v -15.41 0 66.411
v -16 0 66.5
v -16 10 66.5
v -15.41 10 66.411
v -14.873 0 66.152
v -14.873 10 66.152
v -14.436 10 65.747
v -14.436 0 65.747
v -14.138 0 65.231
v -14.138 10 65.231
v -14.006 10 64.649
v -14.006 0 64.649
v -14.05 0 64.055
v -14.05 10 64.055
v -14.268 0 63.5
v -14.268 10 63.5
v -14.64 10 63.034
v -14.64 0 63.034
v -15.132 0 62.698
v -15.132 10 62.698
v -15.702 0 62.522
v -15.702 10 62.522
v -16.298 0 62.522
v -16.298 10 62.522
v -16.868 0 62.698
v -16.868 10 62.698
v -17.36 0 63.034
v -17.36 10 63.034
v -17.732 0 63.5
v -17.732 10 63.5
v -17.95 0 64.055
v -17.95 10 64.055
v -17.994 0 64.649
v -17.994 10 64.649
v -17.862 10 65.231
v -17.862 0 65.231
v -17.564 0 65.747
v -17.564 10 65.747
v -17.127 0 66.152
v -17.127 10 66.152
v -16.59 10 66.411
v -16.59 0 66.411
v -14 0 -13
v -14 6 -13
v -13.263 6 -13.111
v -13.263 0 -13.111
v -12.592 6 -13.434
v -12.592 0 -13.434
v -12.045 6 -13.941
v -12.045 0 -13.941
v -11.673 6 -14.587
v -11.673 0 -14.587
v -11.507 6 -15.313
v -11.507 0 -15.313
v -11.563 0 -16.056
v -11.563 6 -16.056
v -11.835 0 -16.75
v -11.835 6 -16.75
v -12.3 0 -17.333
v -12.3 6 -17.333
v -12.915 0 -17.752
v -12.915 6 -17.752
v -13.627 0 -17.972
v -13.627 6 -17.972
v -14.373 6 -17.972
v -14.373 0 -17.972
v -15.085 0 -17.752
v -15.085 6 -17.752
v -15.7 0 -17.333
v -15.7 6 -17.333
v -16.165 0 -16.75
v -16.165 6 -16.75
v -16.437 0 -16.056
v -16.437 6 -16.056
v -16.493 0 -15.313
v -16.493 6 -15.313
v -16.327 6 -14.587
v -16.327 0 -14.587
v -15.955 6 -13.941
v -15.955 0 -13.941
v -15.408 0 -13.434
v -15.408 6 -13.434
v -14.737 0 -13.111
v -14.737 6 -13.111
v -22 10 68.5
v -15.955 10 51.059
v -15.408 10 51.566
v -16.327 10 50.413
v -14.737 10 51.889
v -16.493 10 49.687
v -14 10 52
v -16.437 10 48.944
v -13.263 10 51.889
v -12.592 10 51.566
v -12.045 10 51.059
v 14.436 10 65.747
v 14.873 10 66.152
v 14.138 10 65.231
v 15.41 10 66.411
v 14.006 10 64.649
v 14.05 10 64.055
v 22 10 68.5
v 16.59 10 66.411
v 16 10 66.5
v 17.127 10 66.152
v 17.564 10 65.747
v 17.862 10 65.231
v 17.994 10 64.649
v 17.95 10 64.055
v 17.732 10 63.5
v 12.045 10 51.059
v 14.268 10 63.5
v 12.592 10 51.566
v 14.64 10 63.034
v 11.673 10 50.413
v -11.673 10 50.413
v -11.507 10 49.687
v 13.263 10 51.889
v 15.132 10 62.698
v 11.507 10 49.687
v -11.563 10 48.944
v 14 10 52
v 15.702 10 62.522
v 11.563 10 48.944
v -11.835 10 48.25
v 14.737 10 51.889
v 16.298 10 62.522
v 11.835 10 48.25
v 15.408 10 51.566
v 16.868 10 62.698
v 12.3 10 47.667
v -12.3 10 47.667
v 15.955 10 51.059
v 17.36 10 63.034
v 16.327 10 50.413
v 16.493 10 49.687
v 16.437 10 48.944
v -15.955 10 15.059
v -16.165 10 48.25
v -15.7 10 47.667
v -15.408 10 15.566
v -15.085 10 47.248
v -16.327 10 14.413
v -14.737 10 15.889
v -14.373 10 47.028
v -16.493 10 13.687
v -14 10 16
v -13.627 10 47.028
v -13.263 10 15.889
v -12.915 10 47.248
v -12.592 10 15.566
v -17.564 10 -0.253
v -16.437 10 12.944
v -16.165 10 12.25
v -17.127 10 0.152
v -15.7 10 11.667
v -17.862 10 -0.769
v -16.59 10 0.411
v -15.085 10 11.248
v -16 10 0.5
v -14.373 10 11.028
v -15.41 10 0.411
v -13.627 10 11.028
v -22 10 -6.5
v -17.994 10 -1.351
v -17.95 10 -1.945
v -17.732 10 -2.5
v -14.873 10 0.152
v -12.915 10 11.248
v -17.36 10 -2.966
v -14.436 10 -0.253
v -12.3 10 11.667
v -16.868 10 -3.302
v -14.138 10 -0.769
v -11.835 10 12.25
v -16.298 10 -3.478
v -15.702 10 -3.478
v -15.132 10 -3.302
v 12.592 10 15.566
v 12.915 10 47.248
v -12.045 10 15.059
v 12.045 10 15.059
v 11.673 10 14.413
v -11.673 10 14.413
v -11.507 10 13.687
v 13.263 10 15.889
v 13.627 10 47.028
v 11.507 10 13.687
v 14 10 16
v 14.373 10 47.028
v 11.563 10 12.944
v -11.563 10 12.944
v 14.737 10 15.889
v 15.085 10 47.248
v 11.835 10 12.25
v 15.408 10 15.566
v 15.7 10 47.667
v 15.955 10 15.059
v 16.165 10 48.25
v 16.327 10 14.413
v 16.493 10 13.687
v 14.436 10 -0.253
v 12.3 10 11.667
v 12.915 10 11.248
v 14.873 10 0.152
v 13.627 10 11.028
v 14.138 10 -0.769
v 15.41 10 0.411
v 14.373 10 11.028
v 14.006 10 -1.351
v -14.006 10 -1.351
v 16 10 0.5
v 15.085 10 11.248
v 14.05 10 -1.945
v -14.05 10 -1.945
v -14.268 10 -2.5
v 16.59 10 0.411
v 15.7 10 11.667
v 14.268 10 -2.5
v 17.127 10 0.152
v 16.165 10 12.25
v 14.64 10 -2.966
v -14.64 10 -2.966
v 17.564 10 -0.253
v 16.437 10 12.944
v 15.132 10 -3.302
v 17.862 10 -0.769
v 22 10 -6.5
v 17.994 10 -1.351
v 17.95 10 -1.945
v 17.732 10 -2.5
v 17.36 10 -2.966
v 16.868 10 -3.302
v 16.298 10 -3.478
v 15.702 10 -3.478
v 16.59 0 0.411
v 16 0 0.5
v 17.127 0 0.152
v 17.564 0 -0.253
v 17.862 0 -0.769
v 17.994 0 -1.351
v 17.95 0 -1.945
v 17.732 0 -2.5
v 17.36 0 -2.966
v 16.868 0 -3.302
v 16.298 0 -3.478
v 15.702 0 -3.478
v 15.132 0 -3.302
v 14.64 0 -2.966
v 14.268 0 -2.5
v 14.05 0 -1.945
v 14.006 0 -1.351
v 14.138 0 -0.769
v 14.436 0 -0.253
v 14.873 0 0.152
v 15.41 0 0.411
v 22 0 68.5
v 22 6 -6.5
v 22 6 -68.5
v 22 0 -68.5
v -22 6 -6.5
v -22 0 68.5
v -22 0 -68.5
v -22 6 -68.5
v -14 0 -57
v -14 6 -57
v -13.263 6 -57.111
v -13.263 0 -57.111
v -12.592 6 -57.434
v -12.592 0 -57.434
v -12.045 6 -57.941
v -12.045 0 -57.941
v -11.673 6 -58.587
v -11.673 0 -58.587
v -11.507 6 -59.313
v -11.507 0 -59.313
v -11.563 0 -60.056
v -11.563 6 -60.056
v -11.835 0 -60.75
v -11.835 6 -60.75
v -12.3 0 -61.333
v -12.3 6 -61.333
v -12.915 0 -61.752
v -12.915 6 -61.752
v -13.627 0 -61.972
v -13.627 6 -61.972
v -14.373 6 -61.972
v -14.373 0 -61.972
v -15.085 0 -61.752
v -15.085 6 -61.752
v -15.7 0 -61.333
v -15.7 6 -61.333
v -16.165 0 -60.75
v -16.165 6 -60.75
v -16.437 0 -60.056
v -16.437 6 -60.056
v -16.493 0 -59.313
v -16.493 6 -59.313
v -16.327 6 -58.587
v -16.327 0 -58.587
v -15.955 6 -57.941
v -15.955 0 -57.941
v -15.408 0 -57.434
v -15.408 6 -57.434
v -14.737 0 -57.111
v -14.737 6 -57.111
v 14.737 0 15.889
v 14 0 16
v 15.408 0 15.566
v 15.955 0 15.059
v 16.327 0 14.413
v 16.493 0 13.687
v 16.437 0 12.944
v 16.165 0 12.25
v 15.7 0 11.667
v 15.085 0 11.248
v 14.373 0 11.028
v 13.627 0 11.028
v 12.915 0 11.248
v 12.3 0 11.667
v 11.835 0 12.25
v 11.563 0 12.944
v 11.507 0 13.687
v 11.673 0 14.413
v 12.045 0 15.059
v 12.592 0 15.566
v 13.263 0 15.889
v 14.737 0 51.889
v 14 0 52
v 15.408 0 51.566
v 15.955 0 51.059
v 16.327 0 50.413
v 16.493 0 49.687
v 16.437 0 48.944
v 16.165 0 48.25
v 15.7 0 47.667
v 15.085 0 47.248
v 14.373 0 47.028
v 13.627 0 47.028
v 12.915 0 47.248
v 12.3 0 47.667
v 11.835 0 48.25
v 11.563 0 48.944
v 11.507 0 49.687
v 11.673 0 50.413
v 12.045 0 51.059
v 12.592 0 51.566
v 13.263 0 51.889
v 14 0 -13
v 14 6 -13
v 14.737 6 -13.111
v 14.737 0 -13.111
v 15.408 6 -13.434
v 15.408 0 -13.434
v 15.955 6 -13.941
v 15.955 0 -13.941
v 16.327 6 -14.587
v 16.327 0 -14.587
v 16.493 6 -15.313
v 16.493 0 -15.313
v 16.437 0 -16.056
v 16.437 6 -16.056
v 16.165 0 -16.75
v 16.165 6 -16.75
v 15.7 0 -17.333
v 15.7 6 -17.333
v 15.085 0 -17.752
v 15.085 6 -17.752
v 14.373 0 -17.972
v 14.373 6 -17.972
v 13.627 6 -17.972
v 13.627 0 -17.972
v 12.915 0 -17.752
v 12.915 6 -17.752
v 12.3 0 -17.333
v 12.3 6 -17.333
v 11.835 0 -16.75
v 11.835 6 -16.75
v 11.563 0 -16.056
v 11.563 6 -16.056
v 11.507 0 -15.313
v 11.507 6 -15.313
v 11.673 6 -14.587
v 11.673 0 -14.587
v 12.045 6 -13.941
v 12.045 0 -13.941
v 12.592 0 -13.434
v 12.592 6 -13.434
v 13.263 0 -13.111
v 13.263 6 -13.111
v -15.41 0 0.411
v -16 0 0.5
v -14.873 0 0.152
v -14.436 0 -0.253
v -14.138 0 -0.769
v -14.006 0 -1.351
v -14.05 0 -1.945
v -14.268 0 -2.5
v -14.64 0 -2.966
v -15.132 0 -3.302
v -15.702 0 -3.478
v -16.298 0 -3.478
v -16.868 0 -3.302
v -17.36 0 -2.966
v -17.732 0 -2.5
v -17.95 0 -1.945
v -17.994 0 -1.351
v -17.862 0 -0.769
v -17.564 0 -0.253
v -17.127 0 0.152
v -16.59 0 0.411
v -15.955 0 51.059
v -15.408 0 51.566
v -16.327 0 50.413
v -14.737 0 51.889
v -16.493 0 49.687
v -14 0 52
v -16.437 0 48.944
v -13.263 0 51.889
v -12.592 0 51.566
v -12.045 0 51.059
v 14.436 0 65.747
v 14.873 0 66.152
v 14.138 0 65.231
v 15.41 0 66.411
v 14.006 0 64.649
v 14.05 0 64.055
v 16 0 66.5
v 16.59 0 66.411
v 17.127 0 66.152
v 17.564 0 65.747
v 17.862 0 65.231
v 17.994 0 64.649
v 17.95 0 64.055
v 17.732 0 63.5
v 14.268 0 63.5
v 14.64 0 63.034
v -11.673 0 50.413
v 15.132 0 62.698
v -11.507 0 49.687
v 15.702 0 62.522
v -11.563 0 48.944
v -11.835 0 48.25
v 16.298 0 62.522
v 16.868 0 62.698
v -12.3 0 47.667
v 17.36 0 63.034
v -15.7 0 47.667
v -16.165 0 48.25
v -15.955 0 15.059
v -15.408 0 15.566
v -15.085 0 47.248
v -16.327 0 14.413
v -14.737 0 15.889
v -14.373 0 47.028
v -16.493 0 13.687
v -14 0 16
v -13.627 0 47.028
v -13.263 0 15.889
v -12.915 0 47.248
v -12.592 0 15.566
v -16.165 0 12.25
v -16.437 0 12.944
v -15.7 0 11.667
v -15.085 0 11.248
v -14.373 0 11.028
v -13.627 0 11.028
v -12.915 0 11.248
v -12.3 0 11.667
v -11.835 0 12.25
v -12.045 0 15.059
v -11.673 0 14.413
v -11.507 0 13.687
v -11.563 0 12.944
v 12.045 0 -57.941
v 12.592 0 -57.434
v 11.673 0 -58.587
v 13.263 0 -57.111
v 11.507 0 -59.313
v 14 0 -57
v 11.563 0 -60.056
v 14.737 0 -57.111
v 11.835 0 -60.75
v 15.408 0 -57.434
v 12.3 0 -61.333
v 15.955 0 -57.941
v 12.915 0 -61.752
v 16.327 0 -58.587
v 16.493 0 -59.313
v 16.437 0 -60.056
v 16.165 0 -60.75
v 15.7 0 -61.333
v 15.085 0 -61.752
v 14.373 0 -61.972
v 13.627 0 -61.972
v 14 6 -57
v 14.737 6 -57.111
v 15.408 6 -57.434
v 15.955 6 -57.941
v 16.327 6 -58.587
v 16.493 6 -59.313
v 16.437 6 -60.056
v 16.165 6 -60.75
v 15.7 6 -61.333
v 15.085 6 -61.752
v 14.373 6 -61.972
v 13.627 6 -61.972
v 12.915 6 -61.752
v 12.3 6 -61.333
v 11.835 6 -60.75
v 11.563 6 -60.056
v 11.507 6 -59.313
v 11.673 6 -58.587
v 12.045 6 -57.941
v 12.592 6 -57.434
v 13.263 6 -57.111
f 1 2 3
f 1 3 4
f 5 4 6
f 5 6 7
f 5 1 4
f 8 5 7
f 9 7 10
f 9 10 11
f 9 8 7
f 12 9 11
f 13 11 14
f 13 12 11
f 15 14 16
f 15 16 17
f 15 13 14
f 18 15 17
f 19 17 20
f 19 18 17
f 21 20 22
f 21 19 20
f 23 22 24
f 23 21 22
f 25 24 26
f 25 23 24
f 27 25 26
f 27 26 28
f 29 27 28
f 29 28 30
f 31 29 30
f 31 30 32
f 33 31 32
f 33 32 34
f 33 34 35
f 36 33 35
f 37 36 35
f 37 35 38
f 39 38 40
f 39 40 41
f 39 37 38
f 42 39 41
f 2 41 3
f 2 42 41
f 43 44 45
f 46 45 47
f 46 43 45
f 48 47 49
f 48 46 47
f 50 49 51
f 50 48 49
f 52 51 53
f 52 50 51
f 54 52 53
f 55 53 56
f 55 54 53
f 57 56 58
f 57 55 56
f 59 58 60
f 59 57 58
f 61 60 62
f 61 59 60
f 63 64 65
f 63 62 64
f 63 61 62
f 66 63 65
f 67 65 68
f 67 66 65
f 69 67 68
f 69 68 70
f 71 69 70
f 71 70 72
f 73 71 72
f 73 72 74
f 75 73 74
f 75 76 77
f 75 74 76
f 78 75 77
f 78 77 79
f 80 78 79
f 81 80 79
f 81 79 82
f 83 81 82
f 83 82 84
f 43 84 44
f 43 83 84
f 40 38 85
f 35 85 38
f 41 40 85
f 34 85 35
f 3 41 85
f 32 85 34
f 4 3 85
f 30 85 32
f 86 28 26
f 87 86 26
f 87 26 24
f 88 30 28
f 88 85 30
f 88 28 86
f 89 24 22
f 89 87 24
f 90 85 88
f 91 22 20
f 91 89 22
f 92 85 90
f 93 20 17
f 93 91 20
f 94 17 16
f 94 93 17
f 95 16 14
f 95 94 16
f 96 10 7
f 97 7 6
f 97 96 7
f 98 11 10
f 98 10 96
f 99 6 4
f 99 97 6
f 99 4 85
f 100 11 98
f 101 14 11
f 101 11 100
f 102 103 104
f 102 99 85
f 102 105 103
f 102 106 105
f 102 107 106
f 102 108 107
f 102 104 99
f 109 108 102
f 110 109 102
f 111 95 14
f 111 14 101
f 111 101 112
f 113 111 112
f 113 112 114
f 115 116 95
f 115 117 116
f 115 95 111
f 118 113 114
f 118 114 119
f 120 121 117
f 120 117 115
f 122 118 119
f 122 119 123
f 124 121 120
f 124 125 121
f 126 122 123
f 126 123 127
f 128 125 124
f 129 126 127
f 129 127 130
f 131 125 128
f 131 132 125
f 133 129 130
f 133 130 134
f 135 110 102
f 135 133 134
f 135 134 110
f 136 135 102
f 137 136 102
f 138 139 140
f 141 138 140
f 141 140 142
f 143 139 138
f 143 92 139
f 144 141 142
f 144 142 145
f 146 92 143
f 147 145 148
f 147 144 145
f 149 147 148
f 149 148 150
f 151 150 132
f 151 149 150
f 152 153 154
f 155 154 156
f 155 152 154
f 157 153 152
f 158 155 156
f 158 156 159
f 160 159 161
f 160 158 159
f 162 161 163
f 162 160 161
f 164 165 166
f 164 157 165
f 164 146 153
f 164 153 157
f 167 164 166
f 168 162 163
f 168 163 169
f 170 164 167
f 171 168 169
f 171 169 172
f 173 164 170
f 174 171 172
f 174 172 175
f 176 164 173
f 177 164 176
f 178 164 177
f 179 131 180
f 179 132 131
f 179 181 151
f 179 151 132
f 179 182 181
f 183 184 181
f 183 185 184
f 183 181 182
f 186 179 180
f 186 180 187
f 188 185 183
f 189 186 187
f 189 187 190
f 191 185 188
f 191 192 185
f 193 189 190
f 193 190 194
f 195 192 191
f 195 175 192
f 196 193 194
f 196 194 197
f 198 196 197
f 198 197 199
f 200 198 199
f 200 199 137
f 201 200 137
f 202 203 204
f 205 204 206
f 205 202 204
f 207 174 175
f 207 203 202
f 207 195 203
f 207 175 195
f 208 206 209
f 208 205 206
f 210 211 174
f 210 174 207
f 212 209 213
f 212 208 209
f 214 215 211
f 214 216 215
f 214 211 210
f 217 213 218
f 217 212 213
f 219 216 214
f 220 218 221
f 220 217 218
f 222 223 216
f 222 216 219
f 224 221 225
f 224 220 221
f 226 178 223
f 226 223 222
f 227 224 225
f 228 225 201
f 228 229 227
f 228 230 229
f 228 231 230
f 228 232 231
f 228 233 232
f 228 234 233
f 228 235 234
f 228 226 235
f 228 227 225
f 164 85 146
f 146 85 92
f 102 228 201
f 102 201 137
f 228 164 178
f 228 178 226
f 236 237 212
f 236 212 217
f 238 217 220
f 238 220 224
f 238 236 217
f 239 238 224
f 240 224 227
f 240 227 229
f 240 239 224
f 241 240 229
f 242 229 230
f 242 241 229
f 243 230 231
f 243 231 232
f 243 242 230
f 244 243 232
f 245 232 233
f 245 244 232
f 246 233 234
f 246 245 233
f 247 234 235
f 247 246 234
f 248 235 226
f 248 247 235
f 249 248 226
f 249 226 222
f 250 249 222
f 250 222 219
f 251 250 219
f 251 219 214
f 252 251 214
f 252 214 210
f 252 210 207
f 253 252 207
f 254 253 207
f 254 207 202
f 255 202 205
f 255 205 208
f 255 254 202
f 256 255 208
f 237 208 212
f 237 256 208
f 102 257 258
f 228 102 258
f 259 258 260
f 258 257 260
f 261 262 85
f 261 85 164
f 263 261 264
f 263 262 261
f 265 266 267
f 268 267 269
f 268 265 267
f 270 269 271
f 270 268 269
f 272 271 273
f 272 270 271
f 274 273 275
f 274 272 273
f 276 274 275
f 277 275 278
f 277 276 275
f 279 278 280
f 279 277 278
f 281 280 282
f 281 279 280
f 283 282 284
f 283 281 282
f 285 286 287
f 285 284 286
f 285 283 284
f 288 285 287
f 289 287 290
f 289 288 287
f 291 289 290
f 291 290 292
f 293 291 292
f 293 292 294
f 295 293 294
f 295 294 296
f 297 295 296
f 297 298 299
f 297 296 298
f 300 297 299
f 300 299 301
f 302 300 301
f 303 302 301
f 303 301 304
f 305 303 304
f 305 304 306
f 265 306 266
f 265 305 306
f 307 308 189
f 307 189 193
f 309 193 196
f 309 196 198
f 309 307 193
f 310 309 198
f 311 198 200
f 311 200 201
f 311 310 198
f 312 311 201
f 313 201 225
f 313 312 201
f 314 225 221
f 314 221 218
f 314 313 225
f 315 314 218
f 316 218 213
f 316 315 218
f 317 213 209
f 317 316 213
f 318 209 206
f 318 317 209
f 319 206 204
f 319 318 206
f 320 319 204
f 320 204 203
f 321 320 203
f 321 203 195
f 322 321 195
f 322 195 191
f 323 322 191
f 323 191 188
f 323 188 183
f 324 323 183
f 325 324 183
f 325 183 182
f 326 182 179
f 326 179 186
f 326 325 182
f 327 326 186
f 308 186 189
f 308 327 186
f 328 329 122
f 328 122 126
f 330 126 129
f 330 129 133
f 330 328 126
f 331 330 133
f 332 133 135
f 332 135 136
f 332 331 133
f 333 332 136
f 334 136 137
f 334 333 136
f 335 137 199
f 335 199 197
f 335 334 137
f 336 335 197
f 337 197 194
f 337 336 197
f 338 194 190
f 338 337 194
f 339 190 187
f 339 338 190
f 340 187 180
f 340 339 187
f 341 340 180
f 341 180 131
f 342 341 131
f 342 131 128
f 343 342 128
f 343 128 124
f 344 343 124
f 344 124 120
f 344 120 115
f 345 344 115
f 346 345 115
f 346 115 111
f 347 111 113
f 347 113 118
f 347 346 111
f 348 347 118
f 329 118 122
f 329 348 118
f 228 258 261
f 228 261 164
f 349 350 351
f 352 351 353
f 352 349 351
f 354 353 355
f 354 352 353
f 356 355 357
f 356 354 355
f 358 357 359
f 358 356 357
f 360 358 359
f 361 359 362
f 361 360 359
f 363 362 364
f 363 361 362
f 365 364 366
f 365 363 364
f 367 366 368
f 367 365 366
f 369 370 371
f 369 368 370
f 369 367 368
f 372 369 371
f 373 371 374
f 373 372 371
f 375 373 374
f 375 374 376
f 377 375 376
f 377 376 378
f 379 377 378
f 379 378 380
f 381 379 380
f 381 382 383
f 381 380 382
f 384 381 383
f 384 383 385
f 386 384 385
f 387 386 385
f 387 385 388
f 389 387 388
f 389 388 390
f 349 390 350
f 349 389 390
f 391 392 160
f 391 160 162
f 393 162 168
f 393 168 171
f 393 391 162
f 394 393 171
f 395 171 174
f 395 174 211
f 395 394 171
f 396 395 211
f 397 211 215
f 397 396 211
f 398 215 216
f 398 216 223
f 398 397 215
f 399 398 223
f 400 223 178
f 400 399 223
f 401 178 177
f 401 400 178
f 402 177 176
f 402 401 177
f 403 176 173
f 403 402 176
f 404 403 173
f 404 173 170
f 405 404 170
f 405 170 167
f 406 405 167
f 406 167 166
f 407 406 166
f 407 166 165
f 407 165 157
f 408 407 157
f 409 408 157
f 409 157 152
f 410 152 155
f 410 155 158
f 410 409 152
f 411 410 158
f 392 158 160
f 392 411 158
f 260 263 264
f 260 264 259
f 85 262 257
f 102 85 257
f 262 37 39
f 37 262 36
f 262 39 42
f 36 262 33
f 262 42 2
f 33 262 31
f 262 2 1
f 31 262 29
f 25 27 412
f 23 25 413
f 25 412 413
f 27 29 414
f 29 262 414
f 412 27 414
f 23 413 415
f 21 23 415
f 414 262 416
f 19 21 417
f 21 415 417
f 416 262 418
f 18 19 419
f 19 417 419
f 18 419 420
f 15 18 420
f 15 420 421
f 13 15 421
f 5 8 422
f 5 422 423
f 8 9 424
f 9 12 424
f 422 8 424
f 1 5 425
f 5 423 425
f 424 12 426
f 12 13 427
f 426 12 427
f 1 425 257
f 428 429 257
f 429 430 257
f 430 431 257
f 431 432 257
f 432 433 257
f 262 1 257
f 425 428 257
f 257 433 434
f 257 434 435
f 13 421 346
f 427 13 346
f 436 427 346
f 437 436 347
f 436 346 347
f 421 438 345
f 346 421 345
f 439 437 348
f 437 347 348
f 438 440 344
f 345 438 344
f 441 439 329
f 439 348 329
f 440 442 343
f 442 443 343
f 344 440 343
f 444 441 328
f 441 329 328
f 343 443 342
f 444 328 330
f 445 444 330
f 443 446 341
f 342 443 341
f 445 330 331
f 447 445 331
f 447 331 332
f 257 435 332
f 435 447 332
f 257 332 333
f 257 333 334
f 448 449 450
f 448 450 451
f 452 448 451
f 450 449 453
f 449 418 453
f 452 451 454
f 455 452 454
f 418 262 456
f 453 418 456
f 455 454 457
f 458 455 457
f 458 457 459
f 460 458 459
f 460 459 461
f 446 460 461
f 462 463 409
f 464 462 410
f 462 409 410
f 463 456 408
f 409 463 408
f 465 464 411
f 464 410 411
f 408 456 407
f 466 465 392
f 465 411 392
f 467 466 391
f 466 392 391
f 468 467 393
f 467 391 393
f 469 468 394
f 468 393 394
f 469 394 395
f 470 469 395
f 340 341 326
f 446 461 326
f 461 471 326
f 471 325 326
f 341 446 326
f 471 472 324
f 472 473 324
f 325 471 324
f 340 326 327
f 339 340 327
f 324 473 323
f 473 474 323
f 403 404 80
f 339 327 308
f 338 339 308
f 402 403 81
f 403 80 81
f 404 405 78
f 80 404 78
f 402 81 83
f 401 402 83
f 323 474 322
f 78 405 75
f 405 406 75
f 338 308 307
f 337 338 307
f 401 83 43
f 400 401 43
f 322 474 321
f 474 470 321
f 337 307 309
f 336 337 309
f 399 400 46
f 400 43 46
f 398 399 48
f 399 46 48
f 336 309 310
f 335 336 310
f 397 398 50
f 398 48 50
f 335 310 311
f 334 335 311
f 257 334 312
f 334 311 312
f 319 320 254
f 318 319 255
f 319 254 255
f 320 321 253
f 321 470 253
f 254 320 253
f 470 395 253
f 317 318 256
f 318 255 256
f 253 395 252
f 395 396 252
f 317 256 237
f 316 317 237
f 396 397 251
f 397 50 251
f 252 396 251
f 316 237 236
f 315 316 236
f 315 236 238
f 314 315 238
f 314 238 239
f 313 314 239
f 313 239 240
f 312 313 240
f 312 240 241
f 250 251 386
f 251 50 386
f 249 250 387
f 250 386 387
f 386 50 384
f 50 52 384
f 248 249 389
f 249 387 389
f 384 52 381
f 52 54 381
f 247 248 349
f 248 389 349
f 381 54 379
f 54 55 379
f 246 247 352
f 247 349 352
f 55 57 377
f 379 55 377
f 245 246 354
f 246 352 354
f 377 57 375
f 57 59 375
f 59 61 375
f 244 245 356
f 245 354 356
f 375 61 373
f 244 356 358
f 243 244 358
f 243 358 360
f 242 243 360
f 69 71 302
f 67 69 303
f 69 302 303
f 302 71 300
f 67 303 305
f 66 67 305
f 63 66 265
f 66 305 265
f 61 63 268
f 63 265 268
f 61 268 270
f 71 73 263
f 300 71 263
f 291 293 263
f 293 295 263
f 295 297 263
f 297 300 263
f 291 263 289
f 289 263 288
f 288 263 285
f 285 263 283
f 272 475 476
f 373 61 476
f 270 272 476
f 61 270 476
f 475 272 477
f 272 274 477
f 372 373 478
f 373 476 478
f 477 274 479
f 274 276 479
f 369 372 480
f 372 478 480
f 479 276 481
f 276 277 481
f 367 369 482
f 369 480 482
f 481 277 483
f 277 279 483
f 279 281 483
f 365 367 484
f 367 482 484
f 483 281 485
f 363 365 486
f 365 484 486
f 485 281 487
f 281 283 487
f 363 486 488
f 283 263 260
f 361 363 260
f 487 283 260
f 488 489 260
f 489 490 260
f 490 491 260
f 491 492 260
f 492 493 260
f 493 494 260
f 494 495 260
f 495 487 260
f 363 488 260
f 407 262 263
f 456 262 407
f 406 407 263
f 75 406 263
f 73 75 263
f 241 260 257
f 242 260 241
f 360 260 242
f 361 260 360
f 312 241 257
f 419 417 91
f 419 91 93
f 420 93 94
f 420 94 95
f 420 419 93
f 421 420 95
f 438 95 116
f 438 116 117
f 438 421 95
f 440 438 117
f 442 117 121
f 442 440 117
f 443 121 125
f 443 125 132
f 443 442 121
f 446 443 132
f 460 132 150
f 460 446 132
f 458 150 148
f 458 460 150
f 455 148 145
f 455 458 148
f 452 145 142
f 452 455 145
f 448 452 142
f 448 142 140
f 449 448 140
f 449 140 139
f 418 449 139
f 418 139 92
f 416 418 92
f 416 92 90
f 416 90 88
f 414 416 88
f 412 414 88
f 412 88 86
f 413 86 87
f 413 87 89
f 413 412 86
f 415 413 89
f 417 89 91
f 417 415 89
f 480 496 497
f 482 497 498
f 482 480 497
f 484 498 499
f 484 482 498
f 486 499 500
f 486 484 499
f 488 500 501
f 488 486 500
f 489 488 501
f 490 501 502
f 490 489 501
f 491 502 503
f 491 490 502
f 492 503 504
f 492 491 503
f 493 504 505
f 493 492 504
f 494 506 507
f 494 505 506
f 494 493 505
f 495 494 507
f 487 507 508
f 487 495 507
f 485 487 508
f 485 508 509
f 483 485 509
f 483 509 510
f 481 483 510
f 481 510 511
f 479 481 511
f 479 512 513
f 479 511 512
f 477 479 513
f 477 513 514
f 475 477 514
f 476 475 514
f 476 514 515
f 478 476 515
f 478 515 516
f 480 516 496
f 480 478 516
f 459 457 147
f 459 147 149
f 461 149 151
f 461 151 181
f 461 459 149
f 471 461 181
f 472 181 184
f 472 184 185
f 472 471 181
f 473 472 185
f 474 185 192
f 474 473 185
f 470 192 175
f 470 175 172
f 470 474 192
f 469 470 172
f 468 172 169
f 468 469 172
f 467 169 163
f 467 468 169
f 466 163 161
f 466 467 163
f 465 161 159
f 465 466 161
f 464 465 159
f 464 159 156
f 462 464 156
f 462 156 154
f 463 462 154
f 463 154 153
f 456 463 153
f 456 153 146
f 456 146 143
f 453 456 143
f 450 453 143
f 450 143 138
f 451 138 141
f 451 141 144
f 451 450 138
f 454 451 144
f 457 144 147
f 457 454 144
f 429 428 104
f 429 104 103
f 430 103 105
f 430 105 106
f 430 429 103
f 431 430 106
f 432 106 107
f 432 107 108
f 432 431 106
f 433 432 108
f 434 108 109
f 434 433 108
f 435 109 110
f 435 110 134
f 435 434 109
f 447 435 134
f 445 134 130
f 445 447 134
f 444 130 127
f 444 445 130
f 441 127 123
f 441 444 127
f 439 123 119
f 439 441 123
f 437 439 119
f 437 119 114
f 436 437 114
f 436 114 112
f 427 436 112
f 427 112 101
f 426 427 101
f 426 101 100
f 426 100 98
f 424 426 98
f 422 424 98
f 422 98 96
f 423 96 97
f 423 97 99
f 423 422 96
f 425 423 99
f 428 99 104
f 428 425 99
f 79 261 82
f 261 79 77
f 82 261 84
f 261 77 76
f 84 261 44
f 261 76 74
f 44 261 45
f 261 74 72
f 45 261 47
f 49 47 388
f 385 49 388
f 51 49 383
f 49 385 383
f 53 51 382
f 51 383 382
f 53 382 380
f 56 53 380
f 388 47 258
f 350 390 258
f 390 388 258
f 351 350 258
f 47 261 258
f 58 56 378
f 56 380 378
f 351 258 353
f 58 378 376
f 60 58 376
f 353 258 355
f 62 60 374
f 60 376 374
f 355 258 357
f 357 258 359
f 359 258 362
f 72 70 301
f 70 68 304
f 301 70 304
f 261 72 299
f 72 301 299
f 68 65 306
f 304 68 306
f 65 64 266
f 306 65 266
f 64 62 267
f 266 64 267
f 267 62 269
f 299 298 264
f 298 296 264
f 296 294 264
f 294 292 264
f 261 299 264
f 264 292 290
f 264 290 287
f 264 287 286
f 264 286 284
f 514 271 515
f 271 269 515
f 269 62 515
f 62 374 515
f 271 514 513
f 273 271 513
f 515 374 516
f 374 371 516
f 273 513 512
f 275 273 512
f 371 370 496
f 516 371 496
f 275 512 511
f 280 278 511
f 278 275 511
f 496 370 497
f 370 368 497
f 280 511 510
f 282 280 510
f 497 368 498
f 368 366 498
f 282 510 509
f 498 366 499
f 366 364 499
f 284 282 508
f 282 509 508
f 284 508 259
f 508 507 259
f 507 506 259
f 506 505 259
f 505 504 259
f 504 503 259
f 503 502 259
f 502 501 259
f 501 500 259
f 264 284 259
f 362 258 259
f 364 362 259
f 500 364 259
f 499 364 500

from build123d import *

# Parameters (mm, degrees)
SKETCH1_W           = 44
SKETCH1_H           = 137
SKETCH1_R           = 2.5
SKETCH1_R_2         = 2
BOSS_EXTRUDE1_DEPTH = 10
SKETCH2_W           = 62
SKETCH2_H           = 4
CUT_EXTRUDE1_DEPTH  = 83.025910541


with BuildPart() as part:
    # Sketch1 → Boss-Extrude1 (new body)
    with BuildSketch(Plane(origin=(0, 0, 0), x_dir=(1, 0, 0), z_dir=(0, 1, 0))):
        Rectangle(SKETCH1_W, SKETCH1_H)
        with Locations(Location((-14, 59.5, 0), (0, 0, 270))):
            Circle(SKETCH1_R, mode=Mode.SUBTRACT)
        with Locations(Location((14, 59.5, 0), (0, 0, 270))):
            Circle(SKETCH1_R, mode=Mode.SUBTRACT)
        with Locations(Location((14, 15.5, 0), (0, 0, 270))):
            Circle(SKETCH1_R, mode=Mode.SUBTRACT)
        with Locations(Location((-14, 15.5, 0), (0, 0, 270))):
            Circle(SKETCH1_R, mode=Mode.SUBTRACT)
        with Locations(Location((14, -13.5, 0), (0, 0, 270))):
            Circle(SKETCH1_R, mode=Mode.SUBTRACT)
        with Locations(Location((-14, -13.5, 0), (0, 0, 270))):
            Circle(SKETCH1_R, mode=Mode.SUBTRACT)
        with Locations(Location((-14, -49.5, 0), (0, 0, 270))):
            Circle(SKETCH1_R, mode=Mode.SUBTRACT)
        with Locations(Location((14, -49.5, 0), (0, 0, 270))):
            Circle(SKETCH1_R, mode=Mode.SUBTRACT)
        with Locations(Location((-16, 1.5, 0), (0, 0, 270))):
            Circle(SKETCH1_R_2, mode=Mode.SUBTRACT)
        with Locations(Location((16, 1.5, 0), (0, 0, 270))):
            Circle(SKETCH1_R_2, mode=Mode.SUBTRACT)
        with Locations(Location((-16, -64.5, 0), (0, 0, 270))):
            Circle(SKETCH1_R_2, mode=Mode.SUBTRACT)
        with Locations(Location((16, -64.5, 0), (0, 0, 270))):
            Circle(SKETCH1_R_2, mode=Mode.SUBTRACT)
    extrude(amount=BOSS_EXTRUDE1_DEPTH)

    # Sketch2 → Cut-Extrude1 (cut, through all)
    with BuildSketch(Plane(origin=(22, 0, 0), x_dir=(0, 0, -1), z_dir=(1, 0, 0))):
        with Locations((37.5, 8)):
            Rectangle(SKETCH2_W, SKETCH2_H)
    extrude(amount=-CUT_EXTRUDE1_DEPTH, mode=Mode.SUBTRACT)


solid = part.part
